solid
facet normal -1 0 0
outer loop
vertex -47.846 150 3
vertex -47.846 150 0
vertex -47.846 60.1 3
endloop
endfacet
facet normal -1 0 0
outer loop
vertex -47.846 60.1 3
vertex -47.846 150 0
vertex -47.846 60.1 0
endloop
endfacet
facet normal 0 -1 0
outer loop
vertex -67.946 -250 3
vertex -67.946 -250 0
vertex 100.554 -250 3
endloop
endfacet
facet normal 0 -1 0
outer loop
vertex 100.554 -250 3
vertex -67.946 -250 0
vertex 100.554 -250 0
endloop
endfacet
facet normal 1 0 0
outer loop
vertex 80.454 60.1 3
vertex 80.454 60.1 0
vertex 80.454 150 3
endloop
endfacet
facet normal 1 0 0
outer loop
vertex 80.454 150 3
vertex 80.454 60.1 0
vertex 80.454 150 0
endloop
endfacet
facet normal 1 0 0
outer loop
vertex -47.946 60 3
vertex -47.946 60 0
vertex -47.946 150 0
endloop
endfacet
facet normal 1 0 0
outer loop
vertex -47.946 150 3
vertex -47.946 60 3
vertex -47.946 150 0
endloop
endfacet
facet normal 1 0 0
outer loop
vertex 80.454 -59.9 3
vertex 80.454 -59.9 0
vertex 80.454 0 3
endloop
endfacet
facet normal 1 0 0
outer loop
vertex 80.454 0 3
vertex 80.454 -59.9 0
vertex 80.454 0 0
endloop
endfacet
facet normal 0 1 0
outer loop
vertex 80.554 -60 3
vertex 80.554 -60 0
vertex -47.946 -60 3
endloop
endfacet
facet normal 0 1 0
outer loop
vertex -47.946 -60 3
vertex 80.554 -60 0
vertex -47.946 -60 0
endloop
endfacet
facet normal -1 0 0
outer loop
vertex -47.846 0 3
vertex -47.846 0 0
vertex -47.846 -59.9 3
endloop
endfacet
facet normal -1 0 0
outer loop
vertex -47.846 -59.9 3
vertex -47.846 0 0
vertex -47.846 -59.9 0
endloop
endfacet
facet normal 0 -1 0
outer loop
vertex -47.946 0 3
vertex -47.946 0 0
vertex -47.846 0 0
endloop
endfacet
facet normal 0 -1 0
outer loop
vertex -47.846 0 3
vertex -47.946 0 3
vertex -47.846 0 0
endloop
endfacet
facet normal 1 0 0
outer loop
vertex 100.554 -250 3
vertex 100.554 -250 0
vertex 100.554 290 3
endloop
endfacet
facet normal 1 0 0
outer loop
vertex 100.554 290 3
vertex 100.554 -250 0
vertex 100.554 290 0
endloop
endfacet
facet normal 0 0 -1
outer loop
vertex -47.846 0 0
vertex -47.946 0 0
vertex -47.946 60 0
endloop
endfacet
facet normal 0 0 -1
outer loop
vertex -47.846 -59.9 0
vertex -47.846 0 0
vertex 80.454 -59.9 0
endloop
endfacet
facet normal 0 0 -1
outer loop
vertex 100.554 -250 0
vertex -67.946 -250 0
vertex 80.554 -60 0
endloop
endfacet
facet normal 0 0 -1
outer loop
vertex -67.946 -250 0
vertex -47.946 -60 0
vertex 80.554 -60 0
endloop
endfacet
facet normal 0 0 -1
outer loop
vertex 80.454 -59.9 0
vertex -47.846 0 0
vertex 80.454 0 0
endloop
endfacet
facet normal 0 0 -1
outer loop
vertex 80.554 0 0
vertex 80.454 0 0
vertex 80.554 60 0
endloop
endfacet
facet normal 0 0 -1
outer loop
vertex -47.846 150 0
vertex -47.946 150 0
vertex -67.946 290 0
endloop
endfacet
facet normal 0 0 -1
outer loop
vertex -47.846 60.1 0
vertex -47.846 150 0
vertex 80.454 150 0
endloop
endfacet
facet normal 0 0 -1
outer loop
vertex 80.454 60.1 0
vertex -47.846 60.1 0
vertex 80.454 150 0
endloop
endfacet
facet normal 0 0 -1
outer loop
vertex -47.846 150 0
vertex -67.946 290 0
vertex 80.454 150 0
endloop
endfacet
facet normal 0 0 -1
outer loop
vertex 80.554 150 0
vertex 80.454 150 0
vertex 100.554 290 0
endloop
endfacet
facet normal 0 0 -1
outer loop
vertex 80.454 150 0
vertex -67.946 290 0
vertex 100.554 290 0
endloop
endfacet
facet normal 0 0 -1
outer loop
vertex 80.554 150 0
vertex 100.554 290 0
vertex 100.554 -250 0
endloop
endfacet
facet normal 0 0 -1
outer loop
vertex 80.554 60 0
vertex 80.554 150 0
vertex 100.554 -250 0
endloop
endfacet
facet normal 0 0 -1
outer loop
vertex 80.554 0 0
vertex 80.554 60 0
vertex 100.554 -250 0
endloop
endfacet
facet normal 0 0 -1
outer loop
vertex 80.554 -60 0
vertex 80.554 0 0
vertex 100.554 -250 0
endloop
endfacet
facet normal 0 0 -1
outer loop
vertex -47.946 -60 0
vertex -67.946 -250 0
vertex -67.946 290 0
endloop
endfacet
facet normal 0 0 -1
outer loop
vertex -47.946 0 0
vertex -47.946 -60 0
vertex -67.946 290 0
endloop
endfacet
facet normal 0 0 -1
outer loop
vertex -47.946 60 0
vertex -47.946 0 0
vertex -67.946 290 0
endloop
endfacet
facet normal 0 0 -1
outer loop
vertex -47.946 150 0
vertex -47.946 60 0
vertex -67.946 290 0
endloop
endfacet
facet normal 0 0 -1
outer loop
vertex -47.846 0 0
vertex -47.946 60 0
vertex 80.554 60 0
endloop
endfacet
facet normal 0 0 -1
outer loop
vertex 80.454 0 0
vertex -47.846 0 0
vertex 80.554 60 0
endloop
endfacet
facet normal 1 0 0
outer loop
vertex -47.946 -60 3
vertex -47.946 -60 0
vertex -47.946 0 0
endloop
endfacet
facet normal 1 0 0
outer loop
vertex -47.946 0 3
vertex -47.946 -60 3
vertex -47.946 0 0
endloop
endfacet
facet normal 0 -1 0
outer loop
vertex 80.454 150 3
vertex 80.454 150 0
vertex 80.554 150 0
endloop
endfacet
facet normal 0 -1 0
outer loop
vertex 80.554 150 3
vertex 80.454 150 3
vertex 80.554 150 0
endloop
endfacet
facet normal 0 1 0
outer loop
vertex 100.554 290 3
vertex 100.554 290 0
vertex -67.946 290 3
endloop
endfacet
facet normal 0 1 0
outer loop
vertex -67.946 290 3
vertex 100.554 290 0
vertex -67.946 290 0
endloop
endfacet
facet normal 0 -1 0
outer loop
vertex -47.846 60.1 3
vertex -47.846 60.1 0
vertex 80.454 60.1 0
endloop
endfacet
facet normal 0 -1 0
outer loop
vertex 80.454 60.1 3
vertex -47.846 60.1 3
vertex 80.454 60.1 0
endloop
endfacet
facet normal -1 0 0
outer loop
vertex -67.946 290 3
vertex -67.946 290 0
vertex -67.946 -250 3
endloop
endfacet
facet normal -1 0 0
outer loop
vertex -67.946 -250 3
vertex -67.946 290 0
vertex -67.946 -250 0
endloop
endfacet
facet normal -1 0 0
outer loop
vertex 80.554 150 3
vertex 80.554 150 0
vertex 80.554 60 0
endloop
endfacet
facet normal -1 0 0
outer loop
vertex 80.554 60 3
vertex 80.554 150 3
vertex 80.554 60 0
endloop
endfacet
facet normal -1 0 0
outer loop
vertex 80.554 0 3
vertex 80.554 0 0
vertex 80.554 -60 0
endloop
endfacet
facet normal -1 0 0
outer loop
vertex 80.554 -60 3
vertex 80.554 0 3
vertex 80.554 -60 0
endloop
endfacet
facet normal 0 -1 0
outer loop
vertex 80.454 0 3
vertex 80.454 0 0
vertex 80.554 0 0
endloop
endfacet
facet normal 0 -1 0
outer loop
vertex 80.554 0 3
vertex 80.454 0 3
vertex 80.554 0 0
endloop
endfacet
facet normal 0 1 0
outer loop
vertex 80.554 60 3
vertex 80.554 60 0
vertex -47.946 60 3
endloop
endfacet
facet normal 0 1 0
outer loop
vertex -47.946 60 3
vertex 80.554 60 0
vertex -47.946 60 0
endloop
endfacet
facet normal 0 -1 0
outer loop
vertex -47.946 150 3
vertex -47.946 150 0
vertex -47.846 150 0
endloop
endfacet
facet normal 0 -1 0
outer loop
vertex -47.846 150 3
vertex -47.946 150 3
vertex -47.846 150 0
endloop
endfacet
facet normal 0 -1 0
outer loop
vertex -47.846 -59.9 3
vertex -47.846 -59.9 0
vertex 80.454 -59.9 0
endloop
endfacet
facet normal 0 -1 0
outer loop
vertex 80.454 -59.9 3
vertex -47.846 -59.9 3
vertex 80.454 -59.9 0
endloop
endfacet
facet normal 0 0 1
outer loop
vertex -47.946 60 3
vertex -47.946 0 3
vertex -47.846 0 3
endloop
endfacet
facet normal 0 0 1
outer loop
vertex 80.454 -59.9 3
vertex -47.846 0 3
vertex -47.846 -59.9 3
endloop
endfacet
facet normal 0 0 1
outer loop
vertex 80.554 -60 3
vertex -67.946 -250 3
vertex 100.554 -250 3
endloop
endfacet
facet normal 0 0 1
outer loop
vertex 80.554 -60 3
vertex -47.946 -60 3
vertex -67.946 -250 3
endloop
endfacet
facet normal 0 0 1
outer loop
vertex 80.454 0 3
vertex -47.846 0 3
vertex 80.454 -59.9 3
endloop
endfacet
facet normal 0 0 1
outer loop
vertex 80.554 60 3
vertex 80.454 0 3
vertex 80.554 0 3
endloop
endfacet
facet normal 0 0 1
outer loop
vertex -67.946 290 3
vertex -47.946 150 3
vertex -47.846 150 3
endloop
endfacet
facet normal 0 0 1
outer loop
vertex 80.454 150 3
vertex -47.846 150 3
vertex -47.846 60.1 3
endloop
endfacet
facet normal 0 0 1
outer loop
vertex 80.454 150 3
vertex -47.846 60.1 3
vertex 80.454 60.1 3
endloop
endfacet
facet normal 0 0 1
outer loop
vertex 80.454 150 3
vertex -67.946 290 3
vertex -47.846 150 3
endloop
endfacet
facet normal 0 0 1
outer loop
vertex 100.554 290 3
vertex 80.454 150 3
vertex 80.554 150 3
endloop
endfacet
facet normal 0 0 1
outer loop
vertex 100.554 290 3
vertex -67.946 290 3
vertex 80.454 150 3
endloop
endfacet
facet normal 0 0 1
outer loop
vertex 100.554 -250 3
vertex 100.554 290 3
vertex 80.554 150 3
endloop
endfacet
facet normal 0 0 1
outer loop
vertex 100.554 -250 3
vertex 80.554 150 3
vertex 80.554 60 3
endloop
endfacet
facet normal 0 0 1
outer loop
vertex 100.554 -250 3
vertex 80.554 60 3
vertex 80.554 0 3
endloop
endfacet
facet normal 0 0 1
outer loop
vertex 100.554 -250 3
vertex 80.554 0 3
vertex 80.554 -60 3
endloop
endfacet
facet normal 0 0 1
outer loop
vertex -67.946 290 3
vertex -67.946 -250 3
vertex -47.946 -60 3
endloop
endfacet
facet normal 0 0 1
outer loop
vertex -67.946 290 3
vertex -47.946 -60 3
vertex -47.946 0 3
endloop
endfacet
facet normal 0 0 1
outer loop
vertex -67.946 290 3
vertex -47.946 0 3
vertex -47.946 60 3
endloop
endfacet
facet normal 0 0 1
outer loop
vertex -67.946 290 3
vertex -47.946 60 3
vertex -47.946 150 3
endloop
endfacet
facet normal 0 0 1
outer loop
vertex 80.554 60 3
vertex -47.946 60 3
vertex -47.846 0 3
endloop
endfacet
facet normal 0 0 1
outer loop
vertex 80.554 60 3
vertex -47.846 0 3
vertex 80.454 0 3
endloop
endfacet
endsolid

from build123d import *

# Parameters (mm, degrees)
F1_DEPTH = 3


with BuildPart() as f1:
    # F0 (on Top) → F1 (new body)
    with BuildSketch(Plane.XY):
        Polygon((-67.946185, 250), (-67.946185, -250), (100.553815, -250), (100.553815, 250), (100.553815, 290), (-67.946185, 290), align=None)
        Polygon((-47.946185, -59.9), (-47.946185, 0), (-47.846185, 0), (-47.846185, -59.9), (80.453815, -59.9), (80.453815, 0), (80.553815, 0), (80.553815, -59.9), (80.553815, -60), (80.453815, -60), (-47.846185, -60), (-47.946185, -60), align=None, mode=Mode.SUBTRACT)
        Polygon((-47.946185, 60.1), (-47.946185, 150), (-47.846185, 150), (-47.846185, 60.1), (80.453815, 60.1), (80.453815, 150), (80.553815, 150), (80.553815, 60.1), (80.553815, 60), (80.453815, 60), (-47.846185, 60), (-47.946185, 60), align=None, mode=Mode.SUBTRACT)
    extrude(amount=F1_DEPTH)


solid = f1.part
